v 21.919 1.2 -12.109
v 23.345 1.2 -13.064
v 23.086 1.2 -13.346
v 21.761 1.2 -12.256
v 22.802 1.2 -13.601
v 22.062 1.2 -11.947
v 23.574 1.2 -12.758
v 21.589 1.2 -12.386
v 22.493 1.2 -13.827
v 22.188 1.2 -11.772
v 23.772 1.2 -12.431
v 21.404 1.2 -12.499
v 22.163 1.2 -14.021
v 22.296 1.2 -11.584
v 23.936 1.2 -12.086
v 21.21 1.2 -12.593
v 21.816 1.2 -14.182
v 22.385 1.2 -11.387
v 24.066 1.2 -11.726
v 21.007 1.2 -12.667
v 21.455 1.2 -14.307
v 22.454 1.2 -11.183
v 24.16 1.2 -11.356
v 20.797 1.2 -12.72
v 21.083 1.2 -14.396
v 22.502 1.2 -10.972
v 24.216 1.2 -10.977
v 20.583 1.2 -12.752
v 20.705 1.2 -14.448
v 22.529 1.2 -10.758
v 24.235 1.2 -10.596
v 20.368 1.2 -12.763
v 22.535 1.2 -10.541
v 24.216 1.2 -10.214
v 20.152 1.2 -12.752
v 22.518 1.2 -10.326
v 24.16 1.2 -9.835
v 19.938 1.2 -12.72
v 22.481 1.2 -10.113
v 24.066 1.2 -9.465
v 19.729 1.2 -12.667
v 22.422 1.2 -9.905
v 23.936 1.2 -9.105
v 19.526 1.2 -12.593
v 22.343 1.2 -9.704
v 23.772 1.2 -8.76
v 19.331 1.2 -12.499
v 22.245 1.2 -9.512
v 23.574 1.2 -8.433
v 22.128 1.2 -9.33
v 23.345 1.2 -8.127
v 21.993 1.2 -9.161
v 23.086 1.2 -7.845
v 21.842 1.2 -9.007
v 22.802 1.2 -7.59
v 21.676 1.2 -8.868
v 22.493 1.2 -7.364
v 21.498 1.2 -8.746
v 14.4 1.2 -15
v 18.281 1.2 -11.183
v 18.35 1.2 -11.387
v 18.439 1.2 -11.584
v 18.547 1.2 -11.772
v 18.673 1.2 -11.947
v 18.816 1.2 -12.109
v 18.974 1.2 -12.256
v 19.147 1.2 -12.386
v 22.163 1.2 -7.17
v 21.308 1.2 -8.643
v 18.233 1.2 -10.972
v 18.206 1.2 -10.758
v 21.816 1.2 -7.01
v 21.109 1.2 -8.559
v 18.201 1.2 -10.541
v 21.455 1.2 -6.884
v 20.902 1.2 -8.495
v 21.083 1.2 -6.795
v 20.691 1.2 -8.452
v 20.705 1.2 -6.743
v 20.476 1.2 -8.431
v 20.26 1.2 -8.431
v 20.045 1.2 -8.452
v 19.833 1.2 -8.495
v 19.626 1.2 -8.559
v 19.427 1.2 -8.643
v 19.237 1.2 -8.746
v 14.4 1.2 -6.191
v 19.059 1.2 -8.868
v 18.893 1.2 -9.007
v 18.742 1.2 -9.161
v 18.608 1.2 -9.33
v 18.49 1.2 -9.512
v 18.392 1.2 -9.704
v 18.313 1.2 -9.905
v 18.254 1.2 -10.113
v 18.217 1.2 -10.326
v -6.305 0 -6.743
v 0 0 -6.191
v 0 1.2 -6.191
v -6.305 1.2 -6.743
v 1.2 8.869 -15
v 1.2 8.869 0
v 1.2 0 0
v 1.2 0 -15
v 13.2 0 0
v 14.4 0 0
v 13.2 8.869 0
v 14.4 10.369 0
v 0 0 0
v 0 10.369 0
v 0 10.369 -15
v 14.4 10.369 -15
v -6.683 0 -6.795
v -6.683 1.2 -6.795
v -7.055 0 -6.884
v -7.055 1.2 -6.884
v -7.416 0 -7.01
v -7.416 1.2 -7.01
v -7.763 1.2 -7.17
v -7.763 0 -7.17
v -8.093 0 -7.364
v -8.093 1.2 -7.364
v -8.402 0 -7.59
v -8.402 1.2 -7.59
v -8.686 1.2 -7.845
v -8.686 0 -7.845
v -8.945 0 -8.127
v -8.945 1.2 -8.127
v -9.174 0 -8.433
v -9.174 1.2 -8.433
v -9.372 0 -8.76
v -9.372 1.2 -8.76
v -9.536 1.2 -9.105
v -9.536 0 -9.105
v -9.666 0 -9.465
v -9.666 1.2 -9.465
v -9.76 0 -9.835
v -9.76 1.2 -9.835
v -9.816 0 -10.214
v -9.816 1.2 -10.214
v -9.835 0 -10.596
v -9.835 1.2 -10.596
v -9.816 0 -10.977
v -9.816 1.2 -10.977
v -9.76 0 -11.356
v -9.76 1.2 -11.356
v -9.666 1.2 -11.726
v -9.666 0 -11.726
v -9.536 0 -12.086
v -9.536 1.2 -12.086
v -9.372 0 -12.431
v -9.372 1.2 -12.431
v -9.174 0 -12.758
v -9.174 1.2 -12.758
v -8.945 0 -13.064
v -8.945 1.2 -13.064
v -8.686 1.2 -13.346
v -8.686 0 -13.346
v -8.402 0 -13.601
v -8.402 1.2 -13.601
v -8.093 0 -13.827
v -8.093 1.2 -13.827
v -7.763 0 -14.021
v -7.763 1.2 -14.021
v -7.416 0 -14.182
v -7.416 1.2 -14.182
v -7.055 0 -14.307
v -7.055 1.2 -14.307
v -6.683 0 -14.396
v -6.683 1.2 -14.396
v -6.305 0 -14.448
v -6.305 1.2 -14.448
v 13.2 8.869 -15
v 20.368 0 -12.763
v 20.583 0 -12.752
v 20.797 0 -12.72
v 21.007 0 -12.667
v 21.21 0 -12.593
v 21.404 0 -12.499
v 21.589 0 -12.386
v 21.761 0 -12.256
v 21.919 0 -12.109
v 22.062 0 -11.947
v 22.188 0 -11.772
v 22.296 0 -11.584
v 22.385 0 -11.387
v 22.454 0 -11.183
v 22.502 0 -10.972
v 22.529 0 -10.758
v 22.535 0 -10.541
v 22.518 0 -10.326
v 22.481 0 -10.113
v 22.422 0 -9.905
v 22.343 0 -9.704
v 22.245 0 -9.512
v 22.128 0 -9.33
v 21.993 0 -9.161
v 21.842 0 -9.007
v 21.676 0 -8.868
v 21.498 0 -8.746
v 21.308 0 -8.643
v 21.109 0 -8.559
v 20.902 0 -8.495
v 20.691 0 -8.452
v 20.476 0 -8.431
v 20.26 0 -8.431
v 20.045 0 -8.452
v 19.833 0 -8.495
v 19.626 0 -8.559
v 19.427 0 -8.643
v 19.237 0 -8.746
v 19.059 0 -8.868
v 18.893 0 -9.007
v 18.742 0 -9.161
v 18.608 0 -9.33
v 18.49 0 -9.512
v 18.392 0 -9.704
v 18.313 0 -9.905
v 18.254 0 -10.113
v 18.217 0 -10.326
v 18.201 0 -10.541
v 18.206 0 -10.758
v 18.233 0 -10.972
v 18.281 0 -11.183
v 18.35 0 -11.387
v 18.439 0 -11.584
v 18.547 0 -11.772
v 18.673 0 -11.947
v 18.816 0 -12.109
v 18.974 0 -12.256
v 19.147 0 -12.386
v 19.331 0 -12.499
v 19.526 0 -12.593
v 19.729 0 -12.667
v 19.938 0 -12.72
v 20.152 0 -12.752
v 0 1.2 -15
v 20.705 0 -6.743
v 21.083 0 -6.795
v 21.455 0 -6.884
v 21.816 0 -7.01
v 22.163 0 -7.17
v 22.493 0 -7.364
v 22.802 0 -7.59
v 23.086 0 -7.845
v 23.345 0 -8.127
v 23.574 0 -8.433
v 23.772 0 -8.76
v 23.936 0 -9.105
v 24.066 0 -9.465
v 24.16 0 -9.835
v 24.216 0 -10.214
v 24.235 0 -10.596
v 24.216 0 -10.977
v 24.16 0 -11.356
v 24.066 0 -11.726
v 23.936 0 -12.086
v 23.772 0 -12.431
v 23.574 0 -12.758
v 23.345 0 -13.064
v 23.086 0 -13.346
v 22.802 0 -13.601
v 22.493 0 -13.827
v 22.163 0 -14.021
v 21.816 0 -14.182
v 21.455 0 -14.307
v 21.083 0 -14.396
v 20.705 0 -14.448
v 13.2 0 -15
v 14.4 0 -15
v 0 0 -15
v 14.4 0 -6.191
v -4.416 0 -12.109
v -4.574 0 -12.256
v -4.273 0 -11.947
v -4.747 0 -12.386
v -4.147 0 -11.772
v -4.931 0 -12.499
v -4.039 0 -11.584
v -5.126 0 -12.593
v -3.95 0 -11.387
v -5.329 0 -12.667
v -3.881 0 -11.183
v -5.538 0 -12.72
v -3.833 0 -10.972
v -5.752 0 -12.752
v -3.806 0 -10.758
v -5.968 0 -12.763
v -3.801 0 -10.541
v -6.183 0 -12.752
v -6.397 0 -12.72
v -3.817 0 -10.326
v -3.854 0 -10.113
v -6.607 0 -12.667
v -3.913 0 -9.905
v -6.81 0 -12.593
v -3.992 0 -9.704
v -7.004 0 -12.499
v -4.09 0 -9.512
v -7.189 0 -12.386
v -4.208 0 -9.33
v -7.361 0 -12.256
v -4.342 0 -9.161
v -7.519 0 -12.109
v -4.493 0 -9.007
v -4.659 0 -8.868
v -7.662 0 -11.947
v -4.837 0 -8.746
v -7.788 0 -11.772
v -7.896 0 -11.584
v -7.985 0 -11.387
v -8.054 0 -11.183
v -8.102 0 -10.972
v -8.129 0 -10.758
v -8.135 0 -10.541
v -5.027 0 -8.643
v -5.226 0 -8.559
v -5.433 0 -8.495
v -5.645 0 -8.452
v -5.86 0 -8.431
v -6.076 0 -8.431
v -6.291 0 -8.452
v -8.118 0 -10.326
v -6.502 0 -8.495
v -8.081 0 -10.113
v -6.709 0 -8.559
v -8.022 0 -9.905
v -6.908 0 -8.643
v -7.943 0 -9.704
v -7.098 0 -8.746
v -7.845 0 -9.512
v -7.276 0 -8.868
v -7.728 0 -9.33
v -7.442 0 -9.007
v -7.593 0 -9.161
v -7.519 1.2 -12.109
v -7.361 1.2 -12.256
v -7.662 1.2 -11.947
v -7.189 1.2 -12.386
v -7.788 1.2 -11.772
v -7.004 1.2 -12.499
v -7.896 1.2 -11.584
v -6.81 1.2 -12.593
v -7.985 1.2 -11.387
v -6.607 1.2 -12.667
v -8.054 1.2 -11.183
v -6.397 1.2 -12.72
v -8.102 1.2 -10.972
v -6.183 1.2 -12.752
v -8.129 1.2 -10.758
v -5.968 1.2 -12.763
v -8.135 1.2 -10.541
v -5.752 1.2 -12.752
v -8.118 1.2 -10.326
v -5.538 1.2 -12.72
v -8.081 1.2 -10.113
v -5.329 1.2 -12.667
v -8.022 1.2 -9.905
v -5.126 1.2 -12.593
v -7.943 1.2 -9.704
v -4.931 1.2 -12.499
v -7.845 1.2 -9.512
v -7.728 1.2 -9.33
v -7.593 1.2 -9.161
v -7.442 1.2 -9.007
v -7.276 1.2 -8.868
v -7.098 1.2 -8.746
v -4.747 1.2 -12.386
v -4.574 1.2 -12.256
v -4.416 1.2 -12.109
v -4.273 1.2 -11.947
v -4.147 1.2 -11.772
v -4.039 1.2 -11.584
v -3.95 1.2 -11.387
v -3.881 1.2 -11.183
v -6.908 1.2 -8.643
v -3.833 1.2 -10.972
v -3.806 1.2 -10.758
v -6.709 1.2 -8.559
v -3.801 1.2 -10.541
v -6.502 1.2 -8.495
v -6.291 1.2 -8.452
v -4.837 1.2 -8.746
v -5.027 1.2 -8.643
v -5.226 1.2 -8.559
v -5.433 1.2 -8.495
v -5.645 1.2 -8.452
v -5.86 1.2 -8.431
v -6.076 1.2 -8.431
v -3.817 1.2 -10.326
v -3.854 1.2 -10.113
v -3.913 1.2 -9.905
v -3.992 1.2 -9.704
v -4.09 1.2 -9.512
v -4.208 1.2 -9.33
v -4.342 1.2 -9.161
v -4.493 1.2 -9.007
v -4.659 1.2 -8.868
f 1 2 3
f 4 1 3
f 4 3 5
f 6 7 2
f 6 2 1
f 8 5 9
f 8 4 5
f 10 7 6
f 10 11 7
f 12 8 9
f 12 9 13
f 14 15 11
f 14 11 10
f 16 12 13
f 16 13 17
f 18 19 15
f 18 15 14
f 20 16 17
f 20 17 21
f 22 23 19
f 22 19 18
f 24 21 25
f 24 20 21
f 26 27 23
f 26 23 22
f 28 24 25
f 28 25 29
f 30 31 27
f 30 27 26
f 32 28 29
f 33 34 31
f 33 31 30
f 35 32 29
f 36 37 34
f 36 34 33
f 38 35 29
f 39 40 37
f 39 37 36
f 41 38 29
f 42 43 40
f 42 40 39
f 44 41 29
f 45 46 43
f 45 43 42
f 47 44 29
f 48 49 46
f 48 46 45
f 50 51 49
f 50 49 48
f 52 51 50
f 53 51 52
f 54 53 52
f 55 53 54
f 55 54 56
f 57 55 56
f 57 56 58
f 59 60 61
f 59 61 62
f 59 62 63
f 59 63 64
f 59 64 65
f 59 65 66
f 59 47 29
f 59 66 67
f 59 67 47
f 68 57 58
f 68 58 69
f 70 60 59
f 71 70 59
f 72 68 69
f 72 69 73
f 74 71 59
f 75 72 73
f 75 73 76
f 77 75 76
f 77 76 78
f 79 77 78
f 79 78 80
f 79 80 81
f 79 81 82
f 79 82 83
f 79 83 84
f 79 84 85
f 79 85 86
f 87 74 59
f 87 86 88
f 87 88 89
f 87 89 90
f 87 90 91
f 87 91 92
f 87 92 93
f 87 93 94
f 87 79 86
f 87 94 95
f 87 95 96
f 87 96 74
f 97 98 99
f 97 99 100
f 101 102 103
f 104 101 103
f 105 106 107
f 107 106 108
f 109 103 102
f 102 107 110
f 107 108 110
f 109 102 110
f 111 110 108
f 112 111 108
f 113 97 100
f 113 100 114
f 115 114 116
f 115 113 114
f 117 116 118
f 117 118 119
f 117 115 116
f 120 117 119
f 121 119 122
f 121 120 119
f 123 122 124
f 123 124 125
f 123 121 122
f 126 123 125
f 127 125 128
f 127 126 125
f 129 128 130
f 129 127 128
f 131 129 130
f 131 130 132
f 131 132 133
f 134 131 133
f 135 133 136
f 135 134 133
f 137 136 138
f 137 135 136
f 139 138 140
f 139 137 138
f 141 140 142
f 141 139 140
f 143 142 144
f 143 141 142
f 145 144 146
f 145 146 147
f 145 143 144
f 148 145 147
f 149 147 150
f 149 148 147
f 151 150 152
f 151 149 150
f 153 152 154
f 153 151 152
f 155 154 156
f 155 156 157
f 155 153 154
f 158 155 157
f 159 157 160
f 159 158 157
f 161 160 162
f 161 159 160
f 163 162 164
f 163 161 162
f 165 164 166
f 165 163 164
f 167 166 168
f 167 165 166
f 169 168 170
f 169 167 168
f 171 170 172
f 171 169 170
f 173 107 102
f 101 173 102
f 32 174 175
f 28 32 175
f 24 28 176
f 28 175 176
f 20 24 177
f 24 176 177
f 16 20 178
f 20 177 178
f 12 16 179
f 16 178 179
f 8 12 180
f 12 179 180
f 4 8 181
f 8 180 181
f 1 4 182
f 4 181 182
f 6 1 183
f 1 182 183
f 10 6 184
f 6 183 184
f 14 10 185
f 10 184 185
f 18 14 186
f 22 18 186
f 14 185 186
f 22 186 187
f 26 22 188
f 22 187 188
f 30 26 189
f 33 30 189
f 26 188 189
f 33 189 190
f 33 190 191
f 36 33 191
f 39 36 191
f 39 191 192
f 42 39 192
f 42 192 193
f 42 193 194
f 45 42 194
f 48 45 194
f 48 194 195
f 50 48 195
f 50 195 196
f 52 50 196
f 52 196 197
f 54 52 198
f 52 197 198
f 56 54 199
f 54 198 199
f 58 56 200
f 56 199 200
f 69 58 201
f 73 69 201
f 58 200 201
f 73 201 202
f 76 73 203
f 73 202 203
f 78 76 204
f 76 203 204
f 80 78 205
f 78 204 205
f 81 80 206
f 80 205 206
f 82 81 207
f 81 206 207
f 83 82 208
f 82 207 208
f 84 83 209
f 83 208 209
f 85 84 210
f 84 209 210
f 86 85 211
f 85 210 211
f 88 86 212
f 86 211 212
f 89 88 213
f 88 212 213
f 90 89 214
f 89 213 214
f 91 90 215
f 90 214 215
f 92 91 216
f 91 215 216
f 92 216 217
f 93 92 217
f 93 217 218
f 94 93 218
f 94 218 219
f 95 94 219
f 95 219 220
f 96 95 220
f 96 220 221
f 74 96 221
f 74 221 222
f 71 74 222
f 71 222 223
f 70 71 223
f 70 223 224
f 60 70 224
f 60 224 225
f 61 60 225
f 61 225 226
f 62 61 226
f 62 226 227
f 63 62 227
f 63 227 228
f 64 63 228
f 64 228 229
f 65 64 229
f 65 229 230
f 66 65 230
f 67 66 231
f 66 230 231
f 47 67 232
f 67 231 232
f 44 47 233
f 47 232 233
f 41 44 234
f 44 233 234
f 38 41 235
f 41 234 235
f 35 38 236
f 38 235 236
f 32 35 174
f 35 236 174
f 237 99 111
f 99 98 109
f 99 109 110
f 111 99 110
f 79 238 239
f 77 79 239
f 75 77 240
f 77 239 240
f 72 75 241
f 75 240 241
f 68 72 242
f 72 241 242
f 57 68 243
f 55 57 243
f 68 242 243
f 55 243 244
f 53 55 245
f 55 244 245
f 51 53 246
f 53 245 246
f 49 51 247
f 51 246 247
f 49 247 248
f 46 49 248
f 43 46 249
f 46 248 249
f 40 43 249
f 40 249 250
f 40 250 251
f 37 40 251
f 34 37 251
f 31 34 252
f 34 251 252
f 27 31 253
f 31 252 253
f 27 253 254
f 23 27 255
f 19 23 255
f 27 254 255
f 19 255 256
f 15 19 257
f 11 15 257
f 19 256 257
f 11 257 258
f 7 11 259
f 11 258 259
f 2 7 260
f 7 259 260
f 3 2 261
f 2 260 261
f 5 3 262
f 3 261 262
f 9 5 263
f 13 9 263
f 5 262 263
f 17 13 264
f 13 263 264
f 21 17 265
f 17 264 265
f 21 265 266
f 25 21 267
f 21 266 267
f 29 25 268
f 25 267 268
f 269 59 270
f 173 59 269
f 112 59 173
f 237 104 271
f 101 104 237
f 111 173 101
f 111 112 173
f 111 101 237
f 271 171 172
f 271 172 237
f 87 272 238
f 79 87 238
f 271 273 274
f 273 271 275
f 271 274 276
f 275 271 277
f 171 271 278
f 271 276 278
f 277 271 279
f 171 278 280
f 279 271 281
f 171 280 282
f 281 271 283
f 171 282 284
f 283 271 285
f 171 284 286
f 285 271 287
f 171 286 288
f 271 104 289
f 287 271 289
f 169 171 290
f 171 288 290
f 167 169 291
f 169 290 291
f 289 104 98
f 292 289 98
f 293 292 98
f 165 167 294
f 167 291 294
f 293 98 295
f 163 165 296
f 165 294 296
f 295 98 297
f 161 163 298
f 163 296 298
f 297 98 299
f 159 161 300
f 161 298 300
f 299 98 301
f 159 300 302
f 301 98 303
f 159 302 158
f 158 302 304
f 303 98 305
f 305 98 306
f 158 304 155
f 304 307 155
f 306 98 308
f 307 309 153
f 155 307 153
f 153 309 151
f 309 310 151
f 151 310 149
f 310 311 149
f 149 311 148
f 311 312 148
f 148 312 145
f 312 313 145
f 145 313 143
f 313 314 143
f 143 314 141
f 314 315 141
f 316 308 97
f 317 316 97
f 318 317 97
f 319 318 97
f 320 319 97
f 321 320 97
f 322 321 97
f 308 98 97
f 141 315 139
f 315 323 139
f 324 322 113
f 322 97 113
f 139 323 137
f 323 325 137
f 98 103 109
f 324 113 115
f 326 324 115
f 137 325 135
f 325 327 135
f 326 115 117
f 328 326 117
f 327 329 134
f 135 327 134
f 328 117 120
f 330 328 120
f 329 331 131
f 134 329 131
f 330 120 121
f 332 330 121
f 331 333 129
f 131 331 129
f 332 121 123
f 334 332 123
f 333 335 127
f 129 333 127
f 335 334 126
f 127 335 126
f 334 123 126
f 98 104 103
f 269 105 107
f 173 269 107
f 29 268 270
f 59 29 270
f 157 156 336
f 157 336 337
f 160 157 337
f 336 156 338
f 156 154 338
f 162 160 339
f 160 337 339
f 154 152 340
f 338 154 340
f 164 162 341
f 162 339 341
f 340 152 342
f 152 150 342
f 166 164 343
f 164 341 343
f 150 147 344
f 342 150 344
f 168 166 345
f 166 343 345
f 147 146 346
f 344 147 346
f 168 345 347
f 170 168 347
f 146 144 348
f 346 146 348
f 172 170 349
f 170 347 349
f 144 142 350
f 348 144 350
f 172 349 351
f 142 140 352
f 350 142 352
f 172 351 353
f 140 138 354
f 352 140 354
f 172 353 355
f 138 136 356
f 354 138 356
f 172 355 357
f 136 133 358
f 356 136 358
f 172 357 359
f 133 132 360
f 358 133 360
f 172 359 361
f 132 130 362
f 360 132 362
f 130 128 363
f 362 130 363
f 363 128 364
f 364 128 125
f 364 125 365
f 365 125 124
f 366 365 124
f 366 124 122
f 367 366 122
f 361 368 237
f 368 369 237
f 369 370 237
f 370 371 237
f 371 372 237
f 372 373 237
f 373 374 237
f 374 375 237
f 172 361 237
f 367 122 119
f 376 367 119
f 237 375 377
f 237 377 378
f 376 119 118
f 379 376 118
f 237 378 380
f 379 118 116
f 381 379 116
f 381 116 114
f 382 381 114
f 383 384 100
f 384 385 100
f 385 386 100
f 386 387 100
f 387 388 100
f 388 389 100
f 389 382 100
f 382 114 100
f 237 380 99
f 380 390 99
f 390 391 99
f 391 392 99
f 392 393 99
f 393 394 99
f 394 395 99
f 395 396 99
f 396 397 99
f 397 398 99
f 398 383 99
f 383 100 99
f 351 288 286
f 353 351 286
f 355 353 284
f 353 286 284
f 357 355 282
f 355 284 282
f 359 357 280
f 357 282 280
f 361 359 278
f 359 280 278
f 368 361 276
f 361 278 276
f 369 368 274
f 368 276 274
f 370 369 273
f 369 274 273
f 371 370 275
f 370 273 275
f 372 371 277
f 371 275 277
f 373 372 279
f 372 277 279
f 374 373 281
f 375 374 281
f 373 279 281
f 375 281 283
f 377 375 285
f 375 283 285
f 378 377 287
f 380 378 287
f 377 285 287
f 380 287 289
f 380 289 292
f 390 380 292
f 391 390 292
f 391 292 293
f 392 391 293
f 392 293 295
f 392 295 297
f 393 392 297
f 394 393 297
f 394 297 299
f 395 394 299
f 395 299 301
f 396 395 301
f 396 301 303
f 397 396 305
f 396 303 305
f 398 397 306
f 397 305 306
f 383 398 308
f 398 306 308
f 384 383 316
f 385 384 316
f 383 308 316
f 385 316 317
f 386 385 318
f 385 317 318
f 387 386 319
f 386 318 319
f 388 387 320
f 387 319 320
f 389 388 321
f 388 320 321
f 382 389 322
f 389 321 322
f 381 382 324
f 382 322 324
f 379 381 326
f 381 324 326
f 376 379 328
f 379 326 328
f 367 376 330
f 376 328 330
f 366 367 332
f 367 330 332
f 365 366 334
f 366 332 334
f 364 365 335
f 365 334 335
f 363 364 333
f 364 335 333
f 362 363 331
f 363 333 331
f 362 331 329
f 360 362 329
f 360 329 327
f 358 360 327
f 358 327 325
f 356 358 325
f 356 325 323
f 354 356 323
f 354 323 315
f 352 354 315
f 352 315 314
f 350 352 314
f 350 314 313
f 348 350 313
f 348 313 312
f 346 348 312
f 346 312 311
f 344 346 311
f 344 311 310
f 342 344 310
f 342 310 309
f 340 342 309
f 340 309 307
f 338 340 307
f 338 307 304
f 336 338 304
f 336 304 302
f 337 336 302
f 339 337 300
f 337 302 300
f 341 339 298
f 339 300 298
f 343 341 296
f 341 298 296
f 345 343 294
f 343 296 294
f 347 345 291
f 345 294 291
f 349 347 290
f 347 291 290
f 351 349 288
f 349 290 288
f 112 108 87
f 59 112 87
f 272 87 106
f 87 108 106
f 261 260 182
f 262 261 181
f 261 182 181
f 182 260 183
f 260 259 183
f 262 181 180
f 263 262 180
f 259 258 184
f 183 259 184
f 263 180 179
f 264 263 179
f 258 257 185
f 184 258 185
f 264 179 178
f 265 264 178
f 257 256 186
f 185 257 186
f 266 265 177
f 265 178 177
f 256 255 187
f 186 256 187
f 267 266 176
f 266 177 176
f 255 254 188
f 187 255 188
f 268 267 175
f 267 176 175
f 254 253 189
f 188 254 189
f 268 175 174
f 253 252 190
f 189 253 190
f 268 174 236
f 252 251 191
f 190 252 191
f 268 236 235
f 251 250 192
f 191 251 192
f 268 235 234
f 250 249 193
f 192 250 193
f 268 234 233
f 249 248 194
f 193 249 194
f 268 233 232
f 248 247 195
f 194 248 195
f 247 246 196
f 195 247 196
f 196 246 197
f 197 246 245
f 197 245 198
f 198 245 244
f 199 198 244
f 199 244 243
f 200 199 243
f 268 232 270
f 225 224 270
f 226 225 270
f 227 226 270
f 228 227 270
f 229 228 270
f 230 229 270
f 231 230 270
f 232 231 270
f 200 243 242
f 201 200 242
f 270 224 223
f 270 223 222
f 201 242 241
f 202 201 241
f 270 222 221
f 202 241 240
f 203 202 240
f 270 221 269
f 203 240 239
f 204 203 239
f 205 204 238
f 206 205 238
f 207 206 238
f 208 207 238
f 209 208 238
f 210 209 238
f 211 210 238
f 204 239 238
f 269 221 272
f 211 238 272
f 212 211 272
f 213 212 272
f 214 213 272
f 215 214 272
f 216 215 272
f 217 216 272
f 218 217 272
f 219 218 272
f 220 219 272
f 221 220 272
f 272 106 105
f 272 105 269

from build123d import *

# Parameters (mm, degrees)
SALIENTE_EXTRUIR1_DEPTH = 15
CROQUIS2_R              = 2.167600076
SALIENTE_EXTRUIR2_DEPTH = 1.2


with BuildPart() as part:
    # Croquis1 → Saliente-Extruir1 (new body)
    with BuildSketch(Plane.XY):
        Polygon((0, 0), (0, 10.369319961), (14.4, 10.369319961), (14.4, 0), (13.2, 0), (13.2, 8.869319961), (1.2, 8.869319961), (1.2, 0), align=None)
    extrude(amount=-SALIENTE_EXTRUIR1_DEPTH)

    # Croquis2 → Saliente-Extruir2 (add)
    # profile 1 of 2: a face of its own
    with BuildSketch(Plane.XZ):
        with BuildLine():
            ThreePointArc((20.704683633, -6.742646275), (24.235200152, -10.595528965), (20.704683633, -14.448411655))
            Line((20.704683633, -14.448411655), (14.4, -15))
            Line((14.4, -15), (14.4, -6.19105793))
            Line((14.4, -6.19105793), (20.704683633, -6.742646275))
        make_face()
        with Locations(Location((20.367600076, -10.595528965, 0), (0, 0, 270))):
            Circle(CROQUIS2_R, mode=Mode.SUBTRACT)
    # profile 2 of 2: a face of its own
    with BuildSketch(Plane.XZ):
        with BuildLine():
            Line((-6.304683633, -14.448411655), (0, -15))
            Line((0, -15), (0, -6.19105793))
            Line((0, -6.19105793), (-6.304683633, -6.742646275))
            ThreePointArc((-6.304683633, -6.742646275), (-9.835200152, -10.595528965), (-6.304683633, -14.448411655))
        make_face()
        with Locations(Location((-5.967600076, -10.595528965, 0), (0, 0, 270))):
            Circle(CROQUIS2_R, mode=Mode.SUBTRACT)
    extrude(amount=-SALIENTE_EXTRUIR2_DEPTH)


solid = part.part
